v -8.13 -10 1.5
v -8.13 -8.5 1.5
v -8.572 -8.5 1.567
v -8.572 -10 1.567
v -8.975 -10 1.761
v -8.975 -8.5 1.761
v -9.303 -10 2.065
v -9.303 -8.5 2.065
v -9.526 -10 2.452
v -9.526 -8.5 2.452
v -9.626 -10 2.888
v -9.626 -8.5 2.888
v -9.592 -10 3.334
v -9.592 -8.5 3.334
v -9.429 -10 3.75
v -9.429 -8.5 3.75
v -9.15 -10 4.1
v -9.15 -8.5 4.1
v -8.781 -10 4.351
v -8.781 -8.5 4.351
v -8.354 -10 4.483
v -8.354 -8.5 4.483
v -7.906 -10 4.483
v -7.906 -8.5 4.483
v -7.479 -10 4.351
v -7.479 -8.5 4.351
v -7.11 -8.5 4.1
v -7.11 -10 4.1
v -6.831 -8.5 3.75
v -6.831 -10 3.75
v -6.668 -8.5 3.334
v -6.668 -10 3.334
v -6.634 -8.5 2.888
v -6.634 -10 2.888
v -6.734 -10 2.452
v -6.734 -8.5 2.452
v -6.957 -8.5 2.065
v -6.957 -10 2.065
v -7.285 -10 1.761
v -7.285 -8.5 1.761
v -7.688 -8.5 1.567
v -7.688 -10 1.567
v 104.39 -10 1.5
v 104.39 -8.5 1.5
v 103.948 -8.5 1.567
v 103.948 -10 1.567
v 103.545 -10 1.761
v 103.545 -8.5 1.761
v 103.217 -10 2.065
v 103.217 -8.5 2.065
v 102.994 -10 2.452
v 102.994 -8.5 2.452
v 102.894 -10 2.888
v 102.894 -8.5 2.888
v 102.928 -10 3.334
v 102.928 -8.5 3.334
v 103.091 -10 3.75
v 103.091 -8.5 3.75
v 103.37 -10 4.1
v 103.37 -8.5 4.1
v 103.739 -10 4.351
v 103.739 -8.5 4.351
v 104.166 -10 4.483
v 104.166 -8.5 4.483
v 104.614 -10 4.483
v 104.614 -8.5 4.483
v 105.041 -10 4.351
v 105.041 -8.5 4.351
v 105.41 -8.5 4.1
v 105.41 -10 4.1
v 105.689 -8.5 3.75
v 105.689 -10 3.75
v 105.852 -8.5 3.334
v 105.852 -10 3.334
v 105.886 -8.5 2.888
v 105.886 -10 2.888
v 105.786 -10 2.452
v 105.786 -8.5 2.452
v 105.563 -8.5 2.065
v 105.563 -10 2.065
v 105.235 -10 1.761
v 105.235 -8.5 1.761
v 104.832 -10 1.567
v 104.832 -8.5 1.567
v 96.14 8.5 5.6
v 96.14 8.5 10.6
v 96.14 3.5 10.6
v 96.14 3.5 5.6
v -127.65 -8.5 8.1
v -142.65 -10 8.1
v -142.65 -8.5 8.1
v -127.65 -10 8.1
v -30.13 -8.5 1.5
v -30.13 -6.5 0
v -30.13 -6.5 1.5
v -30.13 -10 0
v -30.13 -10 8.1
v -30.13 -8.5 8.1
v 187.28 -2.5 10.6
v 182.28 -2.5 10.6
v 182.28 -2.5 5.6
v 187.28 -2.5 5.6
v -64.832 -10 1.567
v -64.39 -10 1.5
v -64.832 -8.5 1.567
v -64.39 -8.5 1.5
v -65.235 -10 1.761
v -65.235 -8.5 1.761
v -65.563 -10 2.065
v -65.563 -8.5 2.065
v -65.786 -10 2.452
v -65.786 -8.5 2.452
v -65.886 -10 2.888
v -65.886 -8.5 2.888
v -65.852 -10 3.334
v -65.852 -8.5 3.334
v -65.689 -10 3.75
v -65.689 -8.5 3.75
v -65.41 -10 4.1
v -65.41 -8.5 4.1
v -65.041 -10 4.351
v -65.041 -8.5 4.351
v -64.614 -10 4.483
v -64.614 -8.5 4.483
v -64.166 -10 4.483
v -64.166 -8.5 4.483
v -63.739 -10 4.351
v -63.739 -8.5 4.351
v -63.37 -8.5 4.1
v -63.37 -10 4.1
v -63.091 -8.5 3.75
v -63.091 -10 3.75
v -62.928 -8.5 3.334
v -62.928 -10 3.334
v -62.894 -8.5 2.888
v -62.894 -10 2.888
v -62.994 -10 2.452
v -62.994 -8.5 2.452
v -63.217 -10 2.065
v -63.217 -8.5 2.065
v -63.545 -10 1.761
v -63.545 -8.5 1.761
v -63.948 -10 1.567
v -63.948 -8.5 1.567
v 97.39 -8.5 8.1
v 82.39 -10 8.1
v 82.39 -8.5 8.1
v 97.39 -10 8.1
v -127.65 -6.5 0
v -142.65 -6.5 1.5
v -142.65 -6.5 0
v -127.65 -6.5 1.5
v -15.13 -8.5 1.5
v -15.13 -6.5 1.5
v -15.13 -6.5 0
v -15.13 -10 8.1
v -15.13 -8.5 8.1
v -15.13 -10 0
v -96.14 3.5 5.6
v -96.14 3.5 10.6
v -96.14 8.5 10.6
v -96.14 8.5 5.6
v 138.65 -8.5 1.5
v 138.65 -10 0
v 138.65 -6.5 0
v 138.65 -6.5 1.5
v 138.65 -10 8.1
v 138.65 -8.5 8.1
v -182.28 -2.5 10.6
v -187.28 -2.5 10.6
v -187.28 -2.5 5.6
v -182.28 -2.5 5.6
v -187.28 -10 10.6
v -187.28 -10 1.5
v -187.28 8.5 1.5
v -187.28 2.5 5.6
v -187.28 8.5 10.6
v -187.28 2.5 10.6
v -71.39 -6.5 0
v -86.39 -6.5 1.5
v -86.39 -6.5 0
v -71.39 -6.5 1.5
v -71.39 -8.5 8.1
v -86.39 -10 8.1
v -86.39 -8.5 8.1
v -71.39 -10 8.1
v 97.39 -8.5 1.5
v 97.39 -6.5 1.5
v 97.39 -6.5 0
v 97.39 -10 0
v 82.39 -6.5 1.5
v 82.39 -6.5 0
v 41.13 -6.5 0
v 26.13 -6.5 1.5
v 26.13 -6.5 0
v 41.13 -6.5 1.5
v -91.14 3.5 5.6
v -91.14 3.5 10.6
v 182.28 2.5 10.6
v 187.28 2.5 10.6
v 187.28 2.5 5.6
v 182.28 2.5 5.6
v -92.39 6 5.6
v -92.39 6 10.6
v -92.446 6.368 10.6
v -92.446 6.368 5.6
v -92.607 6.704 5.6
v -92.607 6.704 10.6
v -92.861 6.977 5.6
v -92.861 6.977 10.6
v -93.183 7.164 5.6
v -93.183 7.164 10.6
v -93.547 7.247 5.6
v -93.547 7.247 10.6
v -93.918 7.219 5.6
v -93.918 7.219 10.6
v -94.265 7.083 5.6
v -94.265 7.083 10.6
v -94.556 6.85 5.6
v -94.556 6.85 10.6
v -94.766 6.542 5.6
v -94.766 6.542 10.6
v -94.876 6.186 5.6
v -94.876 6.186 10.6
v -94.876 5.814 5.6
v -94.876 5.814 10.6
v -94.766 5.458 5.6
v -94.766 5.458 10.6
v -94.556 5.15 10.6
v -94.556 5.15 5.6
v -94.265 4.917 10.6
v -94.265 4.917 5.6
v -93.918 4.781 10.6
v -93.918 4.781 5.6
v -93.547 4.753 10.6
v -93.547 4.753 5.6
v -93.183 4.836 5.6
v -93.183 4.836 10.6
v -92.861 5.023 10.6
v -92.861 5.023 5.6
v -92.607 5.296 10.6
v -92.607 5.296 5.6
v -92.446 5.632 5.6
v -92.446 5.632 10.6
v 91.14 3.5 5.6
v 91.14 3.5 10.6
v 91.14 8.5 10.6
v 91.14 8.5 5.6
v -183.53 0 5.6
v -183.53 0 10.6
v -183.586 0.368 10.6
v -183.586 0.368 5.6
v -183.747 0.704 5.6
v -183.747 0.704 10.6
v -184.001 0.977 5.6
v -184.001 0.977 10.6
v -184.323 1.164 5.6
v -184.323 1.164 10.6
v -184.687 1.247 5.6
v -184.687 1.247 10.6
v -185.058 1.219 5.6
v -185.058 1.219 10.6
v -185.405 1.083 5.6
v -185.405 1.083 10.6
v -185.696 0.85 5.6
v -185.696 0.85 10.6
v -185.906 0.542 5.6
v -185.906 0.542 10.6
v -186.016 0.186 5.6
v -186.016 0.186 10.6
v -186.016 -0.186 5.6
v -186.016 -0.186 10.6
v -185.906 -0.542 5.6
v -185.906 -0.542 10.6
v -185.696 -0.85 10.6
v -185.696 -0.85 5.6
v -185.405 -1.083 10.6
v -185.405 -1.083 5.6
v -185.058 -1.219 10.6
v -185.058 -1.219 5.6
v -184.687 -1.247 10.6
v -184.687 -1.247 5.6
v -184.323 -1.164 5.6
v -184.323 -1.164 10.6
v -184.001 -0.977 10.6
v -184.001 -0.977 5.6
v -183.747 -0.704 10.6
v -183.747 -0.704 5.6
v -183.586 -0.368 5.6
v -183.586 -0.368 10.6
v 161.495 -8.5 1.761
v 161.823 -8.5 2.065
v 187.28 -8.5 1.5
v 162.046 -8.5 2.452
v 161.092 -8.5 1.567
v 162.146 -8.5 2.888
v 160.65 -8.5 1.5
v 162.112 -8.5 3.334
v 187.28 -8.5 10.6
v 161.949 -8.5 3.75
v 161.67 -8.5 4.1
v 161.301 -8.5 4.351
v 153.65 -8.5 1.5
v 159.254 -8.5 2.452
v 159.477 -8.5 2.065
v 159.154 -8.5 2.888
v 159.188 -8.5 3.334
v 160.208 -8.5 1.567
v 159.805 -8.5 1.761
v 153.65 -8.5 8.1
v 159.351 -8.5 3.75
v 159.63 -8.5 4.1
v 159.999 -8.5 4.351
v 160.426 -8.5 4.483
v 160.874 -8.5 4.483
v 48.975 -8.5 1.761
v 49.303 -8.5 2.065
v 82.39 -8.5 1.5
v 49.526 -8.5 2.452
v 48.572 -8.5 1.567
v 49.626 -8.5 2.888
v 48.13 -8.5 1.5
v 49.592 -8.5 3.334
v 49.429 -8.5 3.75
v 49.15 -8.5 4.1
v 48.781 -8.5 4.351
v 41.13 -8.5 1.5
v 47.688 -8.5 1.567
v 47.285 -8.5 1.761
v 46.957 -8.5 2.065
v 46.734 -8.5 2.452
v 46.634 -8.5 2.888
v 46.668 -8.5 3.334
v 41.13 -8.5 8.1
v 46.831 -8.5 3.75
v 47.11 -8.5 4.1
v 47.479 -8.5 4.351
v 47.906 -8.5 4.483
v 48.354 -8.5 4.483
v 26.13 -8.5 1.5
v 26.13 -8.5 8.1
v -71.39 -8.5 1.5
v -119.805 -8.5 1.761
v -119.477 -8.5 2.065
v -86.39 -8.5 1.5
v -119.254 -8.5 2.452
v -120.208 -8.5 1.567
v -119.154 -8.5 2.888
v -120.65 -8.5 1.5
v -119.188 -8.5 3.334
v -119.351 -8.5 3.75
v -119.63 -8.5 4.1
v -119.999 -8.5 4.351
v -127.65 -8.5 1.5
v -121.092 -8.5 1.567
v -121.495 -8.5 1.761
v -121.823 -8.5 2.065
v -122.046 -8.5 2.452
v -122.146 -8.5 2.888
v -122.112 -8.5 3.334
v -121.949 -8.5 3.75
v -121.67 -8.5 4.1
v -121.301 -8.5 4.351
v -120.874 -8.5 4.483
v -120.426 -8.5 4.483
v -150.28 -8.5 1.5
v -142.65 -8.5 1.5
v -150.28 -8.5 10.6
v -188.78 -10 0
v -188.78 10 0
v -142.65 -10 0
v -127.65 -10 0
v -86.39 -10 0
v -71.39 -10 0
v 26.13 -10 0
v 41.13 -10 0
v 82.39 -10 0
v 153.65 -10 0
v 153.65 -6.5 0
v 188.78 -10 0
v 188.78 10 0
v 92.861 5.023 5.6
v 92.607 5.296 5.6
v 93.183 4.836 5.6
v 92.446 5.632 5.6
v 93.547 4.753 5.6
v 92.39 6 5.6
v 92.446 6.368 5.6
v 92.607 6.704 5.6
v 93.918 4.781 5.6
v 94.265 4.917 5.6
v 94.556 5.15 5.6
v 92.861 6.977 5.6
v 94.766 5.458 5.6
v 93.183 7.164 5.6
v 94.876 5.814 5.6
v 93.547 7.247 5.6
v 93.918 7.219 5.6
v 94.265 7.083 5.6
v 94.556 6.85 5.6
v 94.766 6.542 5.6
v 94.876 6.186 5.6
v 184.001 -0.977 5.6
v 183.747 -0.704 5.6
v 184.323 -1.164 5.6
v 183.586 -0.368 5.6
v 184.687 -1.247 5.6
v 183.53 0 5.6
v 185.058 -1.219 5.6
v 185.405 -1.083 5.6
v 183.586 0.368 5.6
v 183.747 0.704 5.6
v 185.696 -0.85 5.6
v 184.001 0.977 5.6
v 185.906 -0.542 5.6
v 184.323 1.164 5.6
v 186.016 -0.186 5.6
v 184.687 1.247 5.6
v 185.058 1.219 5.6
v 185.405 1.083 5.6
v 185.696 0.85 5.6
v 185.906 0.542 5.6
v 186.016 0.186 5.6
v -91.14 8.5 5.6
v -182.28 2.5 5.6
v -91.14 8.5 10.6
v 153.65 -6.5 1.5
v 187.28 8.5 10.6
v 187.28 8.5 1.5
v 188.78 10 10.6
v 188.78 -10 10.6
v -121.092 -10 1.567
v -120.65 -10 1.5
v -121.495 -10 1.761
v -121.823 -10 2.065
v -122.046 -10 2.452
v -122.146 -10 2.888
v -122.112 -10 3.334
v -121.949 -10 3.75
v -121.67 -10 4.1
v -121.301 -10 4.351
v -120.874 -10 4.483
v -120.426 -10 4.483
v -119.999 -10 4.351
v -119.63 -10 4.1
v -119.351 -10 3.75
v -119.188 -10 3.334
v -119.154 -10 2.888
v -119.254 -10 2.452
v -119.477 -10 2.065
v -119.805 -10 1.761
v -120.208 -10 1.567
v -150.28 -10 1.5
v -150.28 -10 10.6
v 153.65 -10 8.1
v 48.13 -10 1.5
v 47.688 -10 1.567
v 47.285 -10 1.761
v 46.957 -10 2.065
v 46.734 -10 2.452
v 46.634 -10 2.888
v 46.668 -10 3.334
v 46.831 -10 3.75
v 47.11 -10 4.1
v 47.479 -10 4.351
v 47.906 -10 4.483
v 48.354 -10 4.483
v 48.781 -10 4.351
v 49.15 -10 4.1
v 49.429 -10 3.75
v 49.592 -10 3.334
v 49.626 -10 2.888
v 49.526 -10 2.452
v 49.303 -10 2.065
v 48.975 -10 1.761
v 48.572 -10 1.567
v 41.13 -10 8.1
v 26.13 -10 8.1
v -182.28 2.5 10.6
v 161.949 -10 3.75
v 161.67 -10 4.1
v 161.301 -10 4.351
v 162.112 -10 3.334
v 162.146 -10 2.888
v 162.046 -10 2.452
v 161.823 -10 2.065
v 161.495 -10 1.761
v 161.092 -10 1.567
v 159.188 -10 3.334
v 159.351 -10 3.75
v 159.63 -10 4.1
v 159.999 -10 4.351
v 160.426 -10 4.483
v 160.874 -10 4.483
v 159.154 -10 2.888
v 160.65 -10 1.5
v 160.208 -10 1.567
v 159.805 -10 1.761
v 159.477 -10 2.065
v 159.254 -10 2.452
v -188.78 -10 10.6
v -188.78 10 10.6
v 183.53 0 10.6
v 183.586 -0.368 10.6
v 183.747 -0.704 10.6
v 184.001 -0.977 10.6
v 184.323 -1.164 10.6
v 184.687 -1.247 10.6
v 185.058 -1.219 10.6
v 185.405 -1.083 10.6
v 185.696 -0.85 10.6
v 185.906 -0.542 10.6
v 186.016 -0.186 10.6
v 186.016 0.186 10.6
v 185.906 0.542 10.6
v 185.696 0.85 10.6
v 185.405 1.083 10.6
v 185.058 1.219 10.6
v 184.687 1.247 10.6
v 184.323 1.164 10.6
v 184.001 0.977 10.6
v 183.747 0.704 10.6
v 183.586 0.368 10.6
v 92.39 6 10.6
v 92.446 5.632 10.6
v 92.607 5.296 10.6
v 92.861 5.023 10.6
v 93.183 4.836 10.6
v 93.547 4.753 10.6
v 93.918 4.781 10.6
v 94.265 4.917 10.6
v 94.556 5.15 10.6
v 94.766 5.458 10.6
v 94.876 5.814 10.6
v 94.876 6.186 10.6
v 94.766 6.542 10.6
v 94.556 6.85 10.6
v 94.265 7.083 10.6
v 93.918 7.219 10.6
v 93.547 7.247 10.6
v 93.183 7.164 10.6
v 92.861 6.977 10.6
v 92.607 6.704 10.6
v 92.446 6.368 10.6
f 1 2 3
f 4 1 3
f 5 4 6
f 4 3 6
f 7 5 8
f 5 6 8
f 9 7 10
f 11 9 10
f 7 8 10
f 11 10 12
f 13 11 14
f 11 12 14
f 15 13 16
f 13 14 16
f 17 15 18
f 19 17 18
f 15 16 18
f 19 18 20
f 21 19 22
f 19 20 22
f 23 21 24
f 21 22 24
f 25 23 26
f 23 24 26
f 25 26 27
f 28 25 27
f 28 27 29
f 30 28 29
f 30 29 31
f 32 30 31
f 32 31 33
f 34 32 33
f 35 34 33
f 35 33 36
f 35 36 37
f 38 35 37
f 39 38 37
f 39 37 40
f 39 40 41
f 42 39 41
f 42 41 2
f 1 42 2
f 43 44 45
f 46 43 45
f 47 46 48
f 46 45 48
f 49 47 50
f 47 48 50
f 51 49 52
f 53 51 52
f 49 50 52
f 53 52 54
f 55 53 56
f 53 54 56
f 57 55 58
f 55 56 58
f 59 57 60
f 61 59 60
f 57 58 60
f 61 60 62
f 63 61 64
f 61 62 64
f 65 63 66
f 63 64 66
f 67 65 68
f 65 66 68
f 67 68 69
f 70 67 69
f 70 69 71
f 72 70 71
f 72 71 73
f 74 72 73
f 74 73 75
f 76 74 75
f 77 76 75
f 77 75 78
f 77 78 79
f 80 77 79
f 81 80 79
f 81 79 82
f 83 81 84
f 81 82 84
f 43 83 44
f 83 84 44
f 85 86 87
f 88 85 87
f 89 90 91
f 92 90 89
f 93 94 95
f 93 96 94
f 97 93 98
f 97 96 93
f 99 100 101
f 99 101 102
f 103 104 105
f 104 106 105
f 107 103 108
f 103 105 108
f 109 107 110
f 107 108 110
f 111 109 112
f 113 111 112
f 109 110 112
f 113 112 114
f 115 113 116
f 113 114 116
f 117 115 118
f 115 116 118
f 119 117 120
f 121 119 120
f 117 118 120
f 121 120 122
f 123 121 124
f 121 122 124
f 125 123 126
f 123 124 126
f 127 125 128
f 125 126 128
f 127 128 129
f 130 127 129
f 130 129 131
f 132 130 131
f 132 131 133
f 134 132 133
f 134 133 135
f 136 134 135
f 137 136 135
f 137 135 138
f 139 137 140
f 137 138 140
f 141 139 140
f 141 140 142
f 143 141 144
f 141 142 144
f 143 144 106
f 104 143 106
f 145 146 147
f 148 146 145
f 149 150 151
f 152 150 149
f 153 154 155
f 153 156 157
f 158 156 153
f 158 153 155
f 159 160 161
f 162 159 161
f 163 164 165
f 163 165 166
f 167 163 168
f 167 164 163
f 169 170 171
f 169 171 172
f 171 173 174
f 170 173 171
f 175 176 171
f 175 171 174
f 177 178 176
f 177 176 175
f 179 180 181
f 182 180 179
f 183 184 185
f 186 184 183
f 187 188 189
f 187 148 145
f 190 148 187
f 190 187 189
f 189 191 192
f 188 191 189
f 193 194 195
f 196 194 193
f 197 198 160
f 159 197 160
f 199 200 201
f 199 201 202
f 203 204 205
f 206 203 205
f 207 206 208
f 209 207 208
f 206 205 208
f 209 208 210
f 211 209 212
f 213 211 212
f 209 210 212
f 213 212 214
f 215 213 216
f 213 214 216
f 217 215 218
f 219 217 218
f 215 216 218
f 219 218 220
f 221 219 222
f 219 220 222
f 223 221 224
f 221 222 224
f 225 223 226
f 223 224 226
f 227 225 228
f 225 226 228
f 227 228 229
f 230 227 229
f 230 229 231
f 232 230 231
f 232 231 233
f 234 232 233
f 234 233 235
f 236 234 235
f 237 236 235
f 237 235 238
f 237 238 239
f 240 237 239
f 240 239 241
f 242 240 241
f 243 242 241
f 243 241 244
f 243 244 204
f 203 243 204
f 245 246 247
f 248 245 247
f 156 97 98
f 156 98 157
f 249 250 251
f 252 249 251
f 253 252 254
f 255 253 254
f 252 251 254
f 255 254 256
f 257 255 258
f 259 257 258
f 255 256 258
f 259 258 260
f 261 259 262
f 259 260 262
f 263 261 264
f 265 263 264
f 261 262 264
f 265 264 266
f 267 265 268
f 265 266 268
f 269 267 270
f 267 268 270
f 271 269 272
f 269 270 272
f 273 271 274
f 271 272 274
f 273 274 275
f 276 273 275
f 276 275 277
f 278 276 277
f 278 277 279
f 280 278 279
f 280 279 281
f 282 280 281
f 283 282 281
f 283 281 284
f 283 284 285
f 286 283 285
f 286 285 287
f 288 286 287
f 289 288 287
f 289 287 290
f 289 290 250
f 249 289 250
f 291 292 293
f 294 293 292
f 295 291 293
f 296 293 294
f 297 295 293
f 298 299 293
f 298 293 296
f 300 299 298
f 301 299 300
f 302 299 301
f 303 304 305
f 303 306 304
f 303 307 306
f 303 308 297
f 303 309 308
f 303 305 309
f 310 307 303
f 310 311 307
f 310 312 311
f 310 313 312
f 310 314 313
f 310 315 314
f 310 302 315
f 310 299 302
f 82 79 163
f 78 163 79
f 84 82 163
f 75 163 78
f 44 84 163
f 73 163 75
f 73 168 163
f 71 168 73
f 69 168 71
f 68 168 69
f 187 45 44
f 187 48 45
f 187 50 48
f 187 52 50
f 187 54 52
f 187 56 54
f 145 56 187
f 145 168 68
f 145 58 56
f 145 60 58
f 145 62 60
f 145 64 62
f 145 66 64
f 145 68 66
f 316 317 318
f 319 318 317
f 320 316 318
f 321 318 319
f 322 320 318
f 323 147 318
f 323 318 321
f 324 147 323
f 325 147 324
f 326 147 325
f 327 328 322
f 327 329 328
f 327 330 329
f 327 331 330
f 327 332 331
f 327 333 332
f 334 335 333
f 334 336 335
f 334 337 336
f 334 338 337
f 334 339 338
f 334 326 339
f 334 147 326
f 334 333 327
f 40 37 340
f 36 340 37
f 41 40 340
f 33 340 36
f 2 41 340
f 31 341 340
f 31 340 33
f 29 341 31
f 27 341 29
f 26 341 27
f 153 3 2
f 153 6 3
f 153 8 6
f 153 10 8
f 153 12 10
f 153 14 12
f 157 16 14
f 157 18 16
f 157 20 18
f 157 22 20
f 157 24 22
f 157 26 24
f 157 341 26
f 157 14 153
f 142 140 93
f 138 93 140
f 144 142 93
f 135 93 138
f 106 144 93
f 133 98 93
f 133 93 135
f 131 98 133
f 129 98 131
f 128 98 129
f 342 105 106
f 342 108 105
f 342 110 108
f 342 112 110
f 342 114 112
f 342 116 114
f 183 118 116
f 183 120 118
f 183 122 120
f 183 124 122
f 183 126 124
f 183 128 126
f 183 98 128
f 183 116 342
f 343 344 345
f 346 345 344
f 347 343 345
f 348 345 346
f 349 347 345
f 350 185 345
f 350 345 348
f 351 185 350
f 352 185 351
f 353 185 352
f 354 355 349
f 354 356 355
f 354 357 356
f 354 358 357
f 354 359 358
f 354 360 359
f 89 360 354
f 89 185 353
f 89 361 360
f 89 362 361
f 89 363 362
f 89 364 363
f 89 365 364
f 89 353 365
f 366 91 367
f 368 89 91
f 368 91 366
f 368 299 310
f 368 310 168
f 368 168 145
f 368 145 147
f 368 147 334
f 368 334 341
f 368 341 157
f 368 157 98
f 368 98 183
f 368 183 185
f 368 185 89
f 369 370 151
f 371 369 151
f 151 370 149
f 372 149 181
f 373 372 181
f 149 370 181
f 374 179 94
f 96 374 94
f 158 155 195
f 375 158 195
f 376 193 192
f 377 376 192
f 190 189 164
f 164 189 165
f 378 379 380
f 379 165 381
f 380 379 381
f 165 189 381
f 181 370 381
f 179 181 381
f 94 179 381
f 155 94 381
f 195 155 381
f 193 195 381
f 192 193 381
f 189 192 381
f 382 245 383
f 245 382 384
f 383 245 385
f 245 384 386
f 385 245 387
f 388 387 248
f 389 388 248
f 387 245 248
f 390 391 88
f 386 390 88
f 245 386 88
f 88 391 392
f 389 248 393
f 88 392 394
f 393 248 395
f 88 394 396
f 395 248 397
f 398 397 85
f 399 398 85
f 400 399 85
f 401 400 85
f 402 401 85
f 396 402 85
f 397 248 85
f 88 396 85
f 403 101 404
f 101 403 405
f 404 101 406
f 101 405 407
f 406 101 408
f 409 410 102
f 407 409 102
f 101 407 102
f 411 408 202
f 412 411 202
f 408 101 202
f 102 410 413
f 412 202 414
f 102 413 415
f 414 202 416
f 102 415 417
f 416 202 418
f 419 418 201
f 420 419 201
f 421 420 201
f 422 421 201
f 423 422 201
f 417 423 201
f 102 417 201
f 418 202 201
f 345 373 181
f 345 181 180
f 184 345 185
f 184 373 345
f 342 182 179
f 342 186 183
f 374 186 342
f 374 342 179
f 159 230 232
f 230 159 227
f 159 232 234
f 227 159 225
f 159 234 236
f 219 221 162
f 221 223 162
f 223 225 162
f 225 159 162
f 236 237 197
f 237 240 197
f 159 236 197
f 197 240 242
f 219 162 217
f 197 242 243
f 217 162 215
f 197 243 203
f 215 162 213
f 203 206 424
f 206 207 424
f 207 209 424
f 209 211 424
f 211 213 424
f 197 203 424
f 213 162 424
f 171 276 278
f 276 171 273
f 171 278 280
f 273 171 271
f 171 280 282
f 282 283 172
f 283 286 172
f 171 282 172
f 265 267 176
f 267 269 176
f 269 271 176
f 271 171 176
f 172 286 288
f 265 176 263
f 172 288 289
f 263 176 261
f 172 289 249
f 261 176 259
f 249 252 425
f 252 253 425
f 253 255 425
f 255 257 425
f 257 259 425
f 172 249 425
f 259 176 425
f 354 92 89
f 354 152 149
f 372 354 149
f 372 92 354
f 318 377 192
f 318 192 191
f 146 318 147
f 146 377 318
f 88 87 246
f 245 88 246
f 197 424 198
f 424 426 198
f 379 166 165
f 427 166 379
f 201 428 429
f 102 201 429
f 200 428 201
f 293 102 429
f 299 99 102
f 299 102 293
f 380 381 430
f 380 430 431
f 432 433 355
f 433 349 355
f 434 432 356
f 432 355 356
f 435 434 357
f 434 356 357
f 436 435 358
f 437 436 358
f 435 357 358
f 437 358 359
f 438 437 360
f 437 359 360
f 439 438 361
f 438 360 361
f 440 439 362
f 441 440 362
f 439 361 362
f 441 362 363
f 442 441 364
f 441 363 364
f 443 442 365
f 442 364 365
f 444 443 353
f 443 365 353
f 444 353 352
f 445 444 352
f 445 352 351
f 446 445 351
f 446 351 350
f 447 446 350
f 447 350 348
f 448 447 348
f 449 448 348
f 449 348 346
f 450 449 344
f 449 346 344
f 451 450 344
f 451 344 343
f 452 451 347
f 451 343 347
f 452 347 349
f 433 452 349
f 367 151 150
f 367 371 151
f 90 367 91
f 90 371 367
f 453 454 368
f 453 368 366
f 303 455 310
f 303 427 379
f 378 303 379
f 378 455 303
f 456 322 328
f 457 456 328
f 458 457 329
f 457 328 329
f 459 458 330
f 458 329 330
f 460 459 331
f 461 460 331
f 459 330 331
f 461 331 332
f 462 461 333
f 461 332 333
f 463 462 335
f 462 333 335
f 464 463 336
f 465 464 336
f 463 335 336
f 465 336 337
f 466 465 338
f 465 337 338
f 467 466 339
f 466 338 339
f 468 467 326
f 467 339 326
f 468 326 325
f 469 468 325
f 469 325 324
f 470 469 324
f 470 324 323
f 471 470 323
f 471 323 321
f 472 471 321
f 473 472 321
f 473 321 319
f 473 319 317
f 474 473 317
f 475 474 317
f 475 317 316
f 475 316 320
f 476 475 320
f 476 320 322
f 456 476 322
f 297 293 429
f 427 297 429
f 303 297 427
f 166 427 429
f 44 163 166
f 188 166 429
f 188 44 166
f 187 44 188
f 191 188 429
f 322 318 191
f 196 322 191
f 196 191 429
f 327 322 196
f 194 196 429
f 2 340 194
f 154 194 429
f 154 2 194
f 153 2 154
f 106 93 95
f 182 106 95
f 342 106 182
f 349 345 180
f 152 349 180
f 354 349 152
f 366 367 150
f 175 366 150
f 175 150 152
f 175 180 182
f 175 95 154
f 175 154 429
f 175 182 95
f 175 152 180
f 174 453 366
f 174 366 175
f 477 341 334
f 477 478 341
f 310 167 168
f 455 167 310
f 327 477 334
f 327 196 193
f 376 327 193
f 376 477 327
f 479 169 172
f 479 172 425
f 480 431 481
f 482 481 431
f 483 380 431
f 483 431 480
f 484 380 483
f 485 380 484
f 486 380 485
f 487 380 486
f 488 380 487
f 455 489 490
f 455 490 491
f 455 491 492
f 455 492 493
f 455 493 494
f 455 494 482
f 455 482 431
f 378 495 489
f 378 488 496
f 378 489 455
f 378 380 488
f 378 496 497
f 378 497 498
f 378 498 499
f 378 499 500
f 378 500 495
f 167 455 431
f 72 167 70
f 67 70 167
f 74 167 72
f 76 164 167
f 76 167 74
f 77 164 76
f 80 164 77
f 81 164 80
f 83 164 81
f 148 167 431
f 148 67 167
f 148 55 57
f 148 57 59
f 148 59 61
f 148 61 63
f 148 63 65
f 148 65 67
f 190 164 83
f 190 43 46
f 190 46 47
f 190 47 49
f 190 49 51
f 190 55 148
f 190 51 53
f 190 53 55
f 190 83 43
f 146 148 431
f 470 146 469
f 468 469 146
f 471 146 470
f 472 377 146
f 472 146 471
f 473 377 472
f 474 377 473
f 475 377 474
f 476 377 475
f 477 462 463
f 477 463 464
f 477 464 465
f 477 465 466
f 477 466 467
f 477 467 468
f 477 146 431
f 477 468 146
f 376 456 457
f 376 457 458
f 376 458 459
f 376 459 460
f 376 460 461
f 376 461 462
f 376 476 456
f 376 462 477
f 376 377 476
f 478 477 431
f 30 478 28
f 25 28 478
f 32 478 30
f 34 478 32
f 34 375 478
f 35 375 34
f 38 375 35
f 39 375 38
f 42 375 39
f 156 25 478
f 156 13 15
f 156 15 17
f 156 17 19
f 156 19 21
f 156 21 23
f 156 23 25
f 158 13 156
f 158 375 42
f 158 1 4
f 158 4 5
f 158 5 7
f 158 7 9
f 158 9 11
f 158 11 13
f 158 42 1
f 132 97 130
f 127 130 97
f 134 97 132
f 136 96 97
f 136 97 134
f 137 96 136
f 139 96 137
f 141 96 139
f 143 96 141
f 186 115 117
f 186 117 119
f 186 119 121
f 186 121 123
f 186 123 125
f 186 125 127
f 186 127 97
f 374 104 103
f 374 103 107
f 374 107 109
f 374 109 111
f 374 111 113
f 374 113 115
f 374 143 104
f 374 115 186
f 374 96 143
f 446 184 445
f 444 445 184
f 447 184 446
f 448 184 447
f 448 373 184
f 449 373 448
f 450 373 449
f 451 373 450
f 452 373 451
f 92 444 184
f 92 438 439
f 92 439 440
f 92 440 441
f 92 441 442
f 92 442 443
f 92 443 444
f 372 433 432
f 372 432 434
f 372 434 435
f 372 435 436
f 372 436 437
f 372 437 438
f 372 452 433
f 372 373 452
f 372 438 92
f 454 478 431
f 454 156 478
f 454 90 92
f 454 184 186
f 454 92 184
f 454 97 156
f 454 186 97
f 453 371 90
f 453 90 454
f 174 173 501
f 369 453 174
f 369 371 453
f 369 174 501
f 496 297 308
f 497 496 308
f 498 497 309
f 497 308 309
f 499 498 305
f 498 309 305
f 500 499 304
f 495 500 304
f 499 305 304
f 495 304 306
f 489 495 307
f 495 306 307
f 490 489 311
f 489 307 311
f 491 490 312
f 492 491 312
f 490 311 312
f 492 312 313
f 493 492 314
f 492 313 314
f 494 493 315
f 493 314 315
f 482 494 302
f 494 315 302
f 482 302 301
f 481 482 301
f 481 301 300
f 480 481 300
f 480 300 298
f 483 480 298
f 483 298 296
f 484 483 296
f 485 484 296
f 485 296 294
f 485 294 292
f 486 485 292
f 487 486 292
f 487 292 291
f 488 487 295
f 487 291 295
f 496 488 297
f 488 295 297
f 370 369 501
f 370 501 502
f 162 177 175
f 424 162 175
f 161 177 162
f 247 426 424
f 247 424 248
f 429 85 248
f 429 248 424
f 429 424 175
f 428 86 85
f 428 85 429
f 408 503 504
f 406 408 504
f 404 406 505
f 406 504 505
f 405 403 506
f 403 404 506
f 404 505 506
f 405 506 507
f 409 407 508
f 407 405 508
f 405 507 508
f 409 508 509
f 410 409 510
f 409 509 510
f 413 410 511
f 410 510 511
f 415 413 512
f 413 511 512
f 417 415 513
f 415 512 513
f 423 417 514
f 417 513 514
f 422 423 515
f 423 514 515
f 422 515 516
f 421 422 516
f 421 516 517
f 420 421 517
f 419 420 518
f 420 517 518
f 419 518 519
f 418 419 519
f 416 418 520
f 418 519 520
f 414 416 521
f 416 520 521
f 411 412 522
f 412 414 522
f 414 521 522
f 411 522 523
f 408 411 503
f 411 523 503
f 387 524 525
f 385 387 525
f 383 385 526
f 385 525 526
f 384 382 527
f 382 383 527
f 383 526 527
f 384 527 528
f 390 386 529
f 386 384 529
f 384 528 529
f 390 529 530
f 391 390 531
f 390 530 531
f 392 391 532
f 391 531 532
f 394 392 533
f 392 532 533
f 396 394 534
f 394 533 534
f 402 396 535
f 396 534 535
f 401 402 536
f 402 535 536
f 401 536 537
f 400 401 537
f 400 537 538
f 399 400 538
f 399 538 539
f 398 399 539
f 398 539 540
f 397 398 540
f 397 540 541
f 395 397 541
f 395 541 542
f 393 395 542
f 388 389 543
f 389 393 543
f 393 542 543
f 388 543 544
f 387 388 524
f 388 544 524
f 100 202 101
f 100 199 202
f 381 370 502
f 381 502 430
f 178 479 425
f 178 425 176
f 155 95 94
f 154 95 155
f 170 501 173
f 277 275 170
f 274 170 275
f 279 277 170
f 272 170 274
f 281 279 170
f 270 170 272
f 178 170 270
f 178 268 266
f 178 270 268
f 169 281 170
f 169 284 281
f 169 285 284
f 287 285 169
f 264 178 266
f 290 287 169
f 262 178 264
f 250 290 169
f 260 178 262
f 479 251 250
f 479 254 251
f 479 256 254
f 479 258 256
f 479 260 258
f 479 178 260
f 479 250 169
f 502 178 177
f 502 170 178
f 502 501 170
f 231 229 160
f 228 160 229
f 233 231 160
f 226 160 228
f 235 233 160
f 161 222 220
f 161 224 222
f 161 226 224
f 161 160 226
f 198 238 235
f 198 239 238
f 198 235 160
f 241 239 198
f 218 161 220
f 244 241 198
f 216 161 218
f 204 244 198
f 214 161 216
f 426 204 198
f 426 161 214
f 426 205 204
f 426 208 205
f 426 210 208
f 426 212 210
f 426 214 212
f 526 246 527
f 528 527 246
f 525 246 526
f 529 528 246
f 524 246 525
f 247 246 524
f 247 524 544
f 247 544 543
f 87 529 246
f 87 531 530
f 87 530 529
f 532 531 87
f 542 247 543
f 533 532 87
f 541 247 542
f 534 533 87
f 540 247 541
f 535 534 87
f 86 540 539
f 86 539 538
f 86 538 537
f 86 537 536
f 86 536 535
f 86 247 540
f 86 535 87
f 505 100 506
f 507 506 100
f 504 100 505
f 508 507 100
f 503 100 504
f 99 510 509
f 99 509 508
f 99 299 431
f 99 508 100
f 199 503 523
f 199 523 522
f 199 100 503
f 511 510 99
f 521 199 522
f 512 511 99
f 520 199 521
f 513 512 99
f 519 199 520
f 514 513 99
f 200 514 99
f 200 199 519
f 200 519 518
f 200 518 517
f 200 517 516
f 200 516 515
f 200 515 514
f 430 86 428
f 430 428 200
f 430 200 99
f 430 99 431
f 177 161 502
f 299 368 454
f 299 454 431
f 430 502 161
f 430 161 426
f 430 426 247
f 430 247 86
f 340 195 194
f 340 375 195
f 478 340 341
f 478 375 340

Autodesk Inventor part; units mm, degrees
ref_plane "YZ Plane" through (0, 0, 0) normal (1, 0, 0) x (0, 1, 0)
ref_plane "XZ Plane" through (0, 0, 0) normal (0, 1, 0) x (-1, 0, 0)
ref_plane "XY Plane" through (0, 0, 0) normal (0, 0, 1) x (1, 0, 0)
sketch "Skizze1" plane through (0, 0, 0) normal (0, 0, 1) x (1, 0, 0)
  line L0 (-188.78, 10) -> (188.78, 10)
  line L1 (188.78, 10) -> (188.78, -10)
  line L2 (188.78, -10) -> (-188.78, -10)
  line L3 (-188.78, -10) -> (-188.78, 10)
  line L4 (-264.292, 0) -> (264.292, 0) construction
  line L5 (0, -14) -> (0, 14) construction
  point P0 (0, 0)
  dimension "d0" = 377.56
  dimension "d1" = 20
extrude "Extrusion1" add sketch "Skizze1" along normal blind 10.6
sketch "Skizze2" plane through (0, 0, 10.6) normal (0, 0, 1) x (1, 0, 0)
  line L0 (-187.28, 8.5) -> (187.28, 8.5)
  line L1 (187.28, 8.5) -> (187.28, -8.5)
  line L2 (187.28, -8.5) -> (-187.28, -8.5)
  line L3 (-187.28, -8.5) -> (-187.28, 8.5)
  line L4 (-264.292, 0) -> (264.292, 0) construction
  line L5 (0, -14) -> (0, 14) construction
  line L6 (-188.78, -10) -> (188.78, -10) construction
  line L7 (188.78, -10) -> (188.78, 10) construction
  point P0 (0, 0)
  dimension "d4" = 1.5
  dimension "d5" = 1.5
extrude "Extrusion2" cut sketch "Skizze2" against normal blind 9.1
sketch "Skizze3" plane through (-188.78, -10, 0) normal (0, -1, 0) x (1, 0, 0)
  line L0 (0, 0) -> (377.56, 0) projected
  line L1 (377.56, 0) -> (377.56, 10.6) projected
  line L2 (0, 10.6) -> (377.56, 10.6) projected
  line L3 (0, 0) -> (0, 10.6) projected
  point P0 (188.78, 0)
  point P1 (349.43, 3)
  dimension "d9" = 28.13
  dimension "d10" = 3
hole "Bohrung1" at (160.65, -10, 3) direction (0, 1, 0) diameter 3 depth 1.5
pattern_linear "Rechteckige Anordnung1" count 6 spacing 56.26 along (-1, 0, 0) of "Bohrung1"
sketch "Skizze4" plane through (-188.78, -10, 0) normal (0, -1, 0) x (1, 0, 0)
  circle A0 centre (68.13, 3) radius 1.5 projected
  circle A1 centre (124.39, 3) radius 1.5 projected
  circle A2 centre (180.65, 3) radius 1.5 projected
  circle A3 centre (236.91, 3) radius 1.5 projected
  circle A4 centre (293.17, 3) radius 1.5 projected
  circle A5 centre (349.43, 3) radius 1.5 projected
  line L0 (0, 0) -> (377.56, 0) projected
  line L1 (377.56, 0) -> (377.56, 10.6) projected
  line L2 (0, 10.6) -> (377.56, 10.6) projected
  line L3 (0, 0) -> (0, 10.6) projected
  line L4 (38.5, 10.6) -> (38.5, 0) construction
  line L5 (1.5, 10.6) -> (1.5, 1.5) projected
  line L6 (38.5, 1.5) -> (1.5, 1.5)
  line L7 (1.5, 1.5) -> (1.5, 10.6)
  line L8 (1.5, 10.6) -> (38.5, 10.6)
  line L9 (38.5, 10.6) -> (38.5, 1.5)
  point P0 (188.78, 0)
  dimension "d21" = 29.63
extrude "Extrusion3" cut sketch "Skizze4" against normal up to surface (1.5 mm away) contours L2 L9 L6 L5
sketch "Skizze5" plane through (-188.78, -10, 0) normal (0, -1, 0) x (1, 0, 0)
  line L0 (0, 0) -> (377.56, 0) projected
  line L1 (342.43, 0) -> (327.43, 0)
  line L2 (327.43, 0) -> (327.43, 8.1)
  line L3 (327.43, 8.1) -> (342.43, 8.1)
  line L4 (342.43, 8.1) -> (342.43, 0)
  line L5 (38.5, 10.6) -> (377.56, 10.6) projected
  line L6 (377.56, 0) -> (377.56, 10.6) projected
  circle A0 centre (349.43, 3) radius 1.5 projected
  point P0 (188.78, 0)
  point P1 (327.43, 0)
  dimension "d24" = 15
  dimension "d25" = 2.5
  dimension "d27" = 7
extrude "Extrusion4" cut sketch "Skizze5" against normal blind 3.5 contours L2 L3 L4 L0
pattern_linear "Rechteckige Anordnung2" count 6 spacing 56.26 along (-1, 0, 0) of "Extrusion4"
sketch "Skizze7" plane through (0, 0, 10.6) normal (0, 0, 1) x (1, 0, 0)
  line L0 (-187.28, -10) -> (-187.28, 8.5) projected
  line L1 (-187.28, -2.5) -> (-182.28, -2.5)
  line L2 (-182.28, -2.5) -> (-182.28, 2.5)
  line L3 (-182.28, 2.5) -> (-187.28, 2.5)
  line L4 (-187.28, 2.5) -> (-187.28, -2.5)
  line L5 (-264.292, 0) -> (264.292, 0) construction
  line L6 (0, -14) -> (0, 14) projected
  line L7 (-187.28, 8.5) -> (187.28, 8.5) projected
  line L8 (-96.14, 8.5) -> (-91.14, 8.5)
  line L9 (-91.14, 8.5) -> (-91.14, 3.5)
  line L10 (-91.14, 3.5) -> (-96.14, 3.5)
  line L11 (-96.14, 3.5) -> (-96.14, 8.5)
  circle A0 centre (-184.78, 0) radius 1.25
  circle A1 centre (-93.64, 6) radius 1.25
  point P0 (0, 0)
  dimension "d36" = 5
  dimension "d37" = 5
  dimension "d38" = 5
  dimension "d39" = 5
  dimension "d40" = 91.14
  dimension "d41" = 91.14
  dimension "d42" = 2.5
  dimension "d43" = 2.5
  dimension "d44" = 93.64
  dimension "d45" = 6
  dimension "d46" = 184.78
extrude "Extrusion6" add sketch "Skizze7" against normal blind 5
mirror "Spiegeln2" about plane through (0, 0, 0) normal (1, 0, 0) of "Extrusion6"
properties part number "PCB_Kabelkanal_1.0"
